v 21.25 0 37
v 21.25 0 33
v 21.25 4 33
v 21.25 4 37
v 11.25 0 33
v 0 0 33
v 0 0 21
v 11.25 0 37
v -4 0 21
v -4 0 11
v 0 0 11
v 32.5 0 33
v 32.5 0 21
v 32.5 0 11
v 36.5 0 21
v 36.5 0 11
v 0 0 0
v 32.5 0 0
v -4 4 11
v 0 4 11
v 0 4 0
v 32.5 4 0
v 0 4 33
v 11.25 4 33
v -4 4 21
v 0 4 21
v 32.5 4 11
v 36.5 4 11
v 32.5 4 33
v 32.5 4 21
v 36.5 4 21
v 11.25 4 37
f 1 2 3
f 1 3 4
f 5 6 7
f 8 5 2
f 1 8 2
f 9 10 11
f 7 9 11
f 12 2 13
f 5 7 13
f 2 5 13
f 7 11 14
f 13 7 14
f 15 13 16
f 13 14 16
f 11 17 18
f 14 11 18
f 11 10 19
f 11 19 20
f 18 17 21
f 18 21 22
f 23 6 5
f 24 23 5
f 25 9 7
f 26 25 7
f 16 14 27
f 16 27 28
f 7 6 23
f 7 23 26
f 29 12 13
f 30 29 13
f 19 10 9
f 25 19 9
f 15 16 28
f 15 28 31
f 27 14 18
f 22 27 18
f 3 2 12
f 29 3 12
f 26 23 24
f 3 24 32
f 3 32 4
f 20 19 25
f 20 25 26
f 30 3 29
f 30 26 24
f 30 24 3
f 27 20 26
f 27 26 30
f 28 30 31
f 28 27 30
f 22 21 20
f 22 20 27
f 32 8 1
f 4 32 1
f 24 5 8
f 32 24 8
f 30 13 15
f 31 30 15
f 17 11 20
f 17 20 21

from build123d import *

# Parameters (mm, degrees)
SKETCH1_W           = 32.5
SKETCH1_H           = 33
BOSS_EXTRUDE1_DEPTH = 4
SKETCH2_W           = 10
SKETCH2_H           = 4
SKETCH2_W_2         = 4
SKETCH2_H_2         = 10
BOSS_EXTRUDE2_DEPTH = 4


with BuildPart() as part:
    # Sketch1 → Boss-Extrude1 (new body)
    with BuildSketch(Plane(origin=(0, 0, 0), x_dir=(1, 0, 0), z_dir=(0, 1, 0))):
        with Locations((16.25, -16.5)):
            Rectangle(SKETCH1_W, SKETCH1_H)
    extrude(amount=BOSS_EXTRUDE1_DEPTH)

    # Sketch2 → Boss-Extrude2 (add, through all)
    with BuildSketch(Plane.XZ):
        with Locations((16.25, 35)):
            Rectangle(SKETCH2_W, SKETCH2_H)
        with Locations((34.5, 16)):
            Rectangle(SKETCH2_W_2, SKETCH2_H_2)
        with Locations((-2, 16)):
            Rectangle(SKETCH2_W_2, SKETCH2_H_2)
    extrude(amount=-BOSS_EXTRUDE2_DEPTH)


solid = part.part
